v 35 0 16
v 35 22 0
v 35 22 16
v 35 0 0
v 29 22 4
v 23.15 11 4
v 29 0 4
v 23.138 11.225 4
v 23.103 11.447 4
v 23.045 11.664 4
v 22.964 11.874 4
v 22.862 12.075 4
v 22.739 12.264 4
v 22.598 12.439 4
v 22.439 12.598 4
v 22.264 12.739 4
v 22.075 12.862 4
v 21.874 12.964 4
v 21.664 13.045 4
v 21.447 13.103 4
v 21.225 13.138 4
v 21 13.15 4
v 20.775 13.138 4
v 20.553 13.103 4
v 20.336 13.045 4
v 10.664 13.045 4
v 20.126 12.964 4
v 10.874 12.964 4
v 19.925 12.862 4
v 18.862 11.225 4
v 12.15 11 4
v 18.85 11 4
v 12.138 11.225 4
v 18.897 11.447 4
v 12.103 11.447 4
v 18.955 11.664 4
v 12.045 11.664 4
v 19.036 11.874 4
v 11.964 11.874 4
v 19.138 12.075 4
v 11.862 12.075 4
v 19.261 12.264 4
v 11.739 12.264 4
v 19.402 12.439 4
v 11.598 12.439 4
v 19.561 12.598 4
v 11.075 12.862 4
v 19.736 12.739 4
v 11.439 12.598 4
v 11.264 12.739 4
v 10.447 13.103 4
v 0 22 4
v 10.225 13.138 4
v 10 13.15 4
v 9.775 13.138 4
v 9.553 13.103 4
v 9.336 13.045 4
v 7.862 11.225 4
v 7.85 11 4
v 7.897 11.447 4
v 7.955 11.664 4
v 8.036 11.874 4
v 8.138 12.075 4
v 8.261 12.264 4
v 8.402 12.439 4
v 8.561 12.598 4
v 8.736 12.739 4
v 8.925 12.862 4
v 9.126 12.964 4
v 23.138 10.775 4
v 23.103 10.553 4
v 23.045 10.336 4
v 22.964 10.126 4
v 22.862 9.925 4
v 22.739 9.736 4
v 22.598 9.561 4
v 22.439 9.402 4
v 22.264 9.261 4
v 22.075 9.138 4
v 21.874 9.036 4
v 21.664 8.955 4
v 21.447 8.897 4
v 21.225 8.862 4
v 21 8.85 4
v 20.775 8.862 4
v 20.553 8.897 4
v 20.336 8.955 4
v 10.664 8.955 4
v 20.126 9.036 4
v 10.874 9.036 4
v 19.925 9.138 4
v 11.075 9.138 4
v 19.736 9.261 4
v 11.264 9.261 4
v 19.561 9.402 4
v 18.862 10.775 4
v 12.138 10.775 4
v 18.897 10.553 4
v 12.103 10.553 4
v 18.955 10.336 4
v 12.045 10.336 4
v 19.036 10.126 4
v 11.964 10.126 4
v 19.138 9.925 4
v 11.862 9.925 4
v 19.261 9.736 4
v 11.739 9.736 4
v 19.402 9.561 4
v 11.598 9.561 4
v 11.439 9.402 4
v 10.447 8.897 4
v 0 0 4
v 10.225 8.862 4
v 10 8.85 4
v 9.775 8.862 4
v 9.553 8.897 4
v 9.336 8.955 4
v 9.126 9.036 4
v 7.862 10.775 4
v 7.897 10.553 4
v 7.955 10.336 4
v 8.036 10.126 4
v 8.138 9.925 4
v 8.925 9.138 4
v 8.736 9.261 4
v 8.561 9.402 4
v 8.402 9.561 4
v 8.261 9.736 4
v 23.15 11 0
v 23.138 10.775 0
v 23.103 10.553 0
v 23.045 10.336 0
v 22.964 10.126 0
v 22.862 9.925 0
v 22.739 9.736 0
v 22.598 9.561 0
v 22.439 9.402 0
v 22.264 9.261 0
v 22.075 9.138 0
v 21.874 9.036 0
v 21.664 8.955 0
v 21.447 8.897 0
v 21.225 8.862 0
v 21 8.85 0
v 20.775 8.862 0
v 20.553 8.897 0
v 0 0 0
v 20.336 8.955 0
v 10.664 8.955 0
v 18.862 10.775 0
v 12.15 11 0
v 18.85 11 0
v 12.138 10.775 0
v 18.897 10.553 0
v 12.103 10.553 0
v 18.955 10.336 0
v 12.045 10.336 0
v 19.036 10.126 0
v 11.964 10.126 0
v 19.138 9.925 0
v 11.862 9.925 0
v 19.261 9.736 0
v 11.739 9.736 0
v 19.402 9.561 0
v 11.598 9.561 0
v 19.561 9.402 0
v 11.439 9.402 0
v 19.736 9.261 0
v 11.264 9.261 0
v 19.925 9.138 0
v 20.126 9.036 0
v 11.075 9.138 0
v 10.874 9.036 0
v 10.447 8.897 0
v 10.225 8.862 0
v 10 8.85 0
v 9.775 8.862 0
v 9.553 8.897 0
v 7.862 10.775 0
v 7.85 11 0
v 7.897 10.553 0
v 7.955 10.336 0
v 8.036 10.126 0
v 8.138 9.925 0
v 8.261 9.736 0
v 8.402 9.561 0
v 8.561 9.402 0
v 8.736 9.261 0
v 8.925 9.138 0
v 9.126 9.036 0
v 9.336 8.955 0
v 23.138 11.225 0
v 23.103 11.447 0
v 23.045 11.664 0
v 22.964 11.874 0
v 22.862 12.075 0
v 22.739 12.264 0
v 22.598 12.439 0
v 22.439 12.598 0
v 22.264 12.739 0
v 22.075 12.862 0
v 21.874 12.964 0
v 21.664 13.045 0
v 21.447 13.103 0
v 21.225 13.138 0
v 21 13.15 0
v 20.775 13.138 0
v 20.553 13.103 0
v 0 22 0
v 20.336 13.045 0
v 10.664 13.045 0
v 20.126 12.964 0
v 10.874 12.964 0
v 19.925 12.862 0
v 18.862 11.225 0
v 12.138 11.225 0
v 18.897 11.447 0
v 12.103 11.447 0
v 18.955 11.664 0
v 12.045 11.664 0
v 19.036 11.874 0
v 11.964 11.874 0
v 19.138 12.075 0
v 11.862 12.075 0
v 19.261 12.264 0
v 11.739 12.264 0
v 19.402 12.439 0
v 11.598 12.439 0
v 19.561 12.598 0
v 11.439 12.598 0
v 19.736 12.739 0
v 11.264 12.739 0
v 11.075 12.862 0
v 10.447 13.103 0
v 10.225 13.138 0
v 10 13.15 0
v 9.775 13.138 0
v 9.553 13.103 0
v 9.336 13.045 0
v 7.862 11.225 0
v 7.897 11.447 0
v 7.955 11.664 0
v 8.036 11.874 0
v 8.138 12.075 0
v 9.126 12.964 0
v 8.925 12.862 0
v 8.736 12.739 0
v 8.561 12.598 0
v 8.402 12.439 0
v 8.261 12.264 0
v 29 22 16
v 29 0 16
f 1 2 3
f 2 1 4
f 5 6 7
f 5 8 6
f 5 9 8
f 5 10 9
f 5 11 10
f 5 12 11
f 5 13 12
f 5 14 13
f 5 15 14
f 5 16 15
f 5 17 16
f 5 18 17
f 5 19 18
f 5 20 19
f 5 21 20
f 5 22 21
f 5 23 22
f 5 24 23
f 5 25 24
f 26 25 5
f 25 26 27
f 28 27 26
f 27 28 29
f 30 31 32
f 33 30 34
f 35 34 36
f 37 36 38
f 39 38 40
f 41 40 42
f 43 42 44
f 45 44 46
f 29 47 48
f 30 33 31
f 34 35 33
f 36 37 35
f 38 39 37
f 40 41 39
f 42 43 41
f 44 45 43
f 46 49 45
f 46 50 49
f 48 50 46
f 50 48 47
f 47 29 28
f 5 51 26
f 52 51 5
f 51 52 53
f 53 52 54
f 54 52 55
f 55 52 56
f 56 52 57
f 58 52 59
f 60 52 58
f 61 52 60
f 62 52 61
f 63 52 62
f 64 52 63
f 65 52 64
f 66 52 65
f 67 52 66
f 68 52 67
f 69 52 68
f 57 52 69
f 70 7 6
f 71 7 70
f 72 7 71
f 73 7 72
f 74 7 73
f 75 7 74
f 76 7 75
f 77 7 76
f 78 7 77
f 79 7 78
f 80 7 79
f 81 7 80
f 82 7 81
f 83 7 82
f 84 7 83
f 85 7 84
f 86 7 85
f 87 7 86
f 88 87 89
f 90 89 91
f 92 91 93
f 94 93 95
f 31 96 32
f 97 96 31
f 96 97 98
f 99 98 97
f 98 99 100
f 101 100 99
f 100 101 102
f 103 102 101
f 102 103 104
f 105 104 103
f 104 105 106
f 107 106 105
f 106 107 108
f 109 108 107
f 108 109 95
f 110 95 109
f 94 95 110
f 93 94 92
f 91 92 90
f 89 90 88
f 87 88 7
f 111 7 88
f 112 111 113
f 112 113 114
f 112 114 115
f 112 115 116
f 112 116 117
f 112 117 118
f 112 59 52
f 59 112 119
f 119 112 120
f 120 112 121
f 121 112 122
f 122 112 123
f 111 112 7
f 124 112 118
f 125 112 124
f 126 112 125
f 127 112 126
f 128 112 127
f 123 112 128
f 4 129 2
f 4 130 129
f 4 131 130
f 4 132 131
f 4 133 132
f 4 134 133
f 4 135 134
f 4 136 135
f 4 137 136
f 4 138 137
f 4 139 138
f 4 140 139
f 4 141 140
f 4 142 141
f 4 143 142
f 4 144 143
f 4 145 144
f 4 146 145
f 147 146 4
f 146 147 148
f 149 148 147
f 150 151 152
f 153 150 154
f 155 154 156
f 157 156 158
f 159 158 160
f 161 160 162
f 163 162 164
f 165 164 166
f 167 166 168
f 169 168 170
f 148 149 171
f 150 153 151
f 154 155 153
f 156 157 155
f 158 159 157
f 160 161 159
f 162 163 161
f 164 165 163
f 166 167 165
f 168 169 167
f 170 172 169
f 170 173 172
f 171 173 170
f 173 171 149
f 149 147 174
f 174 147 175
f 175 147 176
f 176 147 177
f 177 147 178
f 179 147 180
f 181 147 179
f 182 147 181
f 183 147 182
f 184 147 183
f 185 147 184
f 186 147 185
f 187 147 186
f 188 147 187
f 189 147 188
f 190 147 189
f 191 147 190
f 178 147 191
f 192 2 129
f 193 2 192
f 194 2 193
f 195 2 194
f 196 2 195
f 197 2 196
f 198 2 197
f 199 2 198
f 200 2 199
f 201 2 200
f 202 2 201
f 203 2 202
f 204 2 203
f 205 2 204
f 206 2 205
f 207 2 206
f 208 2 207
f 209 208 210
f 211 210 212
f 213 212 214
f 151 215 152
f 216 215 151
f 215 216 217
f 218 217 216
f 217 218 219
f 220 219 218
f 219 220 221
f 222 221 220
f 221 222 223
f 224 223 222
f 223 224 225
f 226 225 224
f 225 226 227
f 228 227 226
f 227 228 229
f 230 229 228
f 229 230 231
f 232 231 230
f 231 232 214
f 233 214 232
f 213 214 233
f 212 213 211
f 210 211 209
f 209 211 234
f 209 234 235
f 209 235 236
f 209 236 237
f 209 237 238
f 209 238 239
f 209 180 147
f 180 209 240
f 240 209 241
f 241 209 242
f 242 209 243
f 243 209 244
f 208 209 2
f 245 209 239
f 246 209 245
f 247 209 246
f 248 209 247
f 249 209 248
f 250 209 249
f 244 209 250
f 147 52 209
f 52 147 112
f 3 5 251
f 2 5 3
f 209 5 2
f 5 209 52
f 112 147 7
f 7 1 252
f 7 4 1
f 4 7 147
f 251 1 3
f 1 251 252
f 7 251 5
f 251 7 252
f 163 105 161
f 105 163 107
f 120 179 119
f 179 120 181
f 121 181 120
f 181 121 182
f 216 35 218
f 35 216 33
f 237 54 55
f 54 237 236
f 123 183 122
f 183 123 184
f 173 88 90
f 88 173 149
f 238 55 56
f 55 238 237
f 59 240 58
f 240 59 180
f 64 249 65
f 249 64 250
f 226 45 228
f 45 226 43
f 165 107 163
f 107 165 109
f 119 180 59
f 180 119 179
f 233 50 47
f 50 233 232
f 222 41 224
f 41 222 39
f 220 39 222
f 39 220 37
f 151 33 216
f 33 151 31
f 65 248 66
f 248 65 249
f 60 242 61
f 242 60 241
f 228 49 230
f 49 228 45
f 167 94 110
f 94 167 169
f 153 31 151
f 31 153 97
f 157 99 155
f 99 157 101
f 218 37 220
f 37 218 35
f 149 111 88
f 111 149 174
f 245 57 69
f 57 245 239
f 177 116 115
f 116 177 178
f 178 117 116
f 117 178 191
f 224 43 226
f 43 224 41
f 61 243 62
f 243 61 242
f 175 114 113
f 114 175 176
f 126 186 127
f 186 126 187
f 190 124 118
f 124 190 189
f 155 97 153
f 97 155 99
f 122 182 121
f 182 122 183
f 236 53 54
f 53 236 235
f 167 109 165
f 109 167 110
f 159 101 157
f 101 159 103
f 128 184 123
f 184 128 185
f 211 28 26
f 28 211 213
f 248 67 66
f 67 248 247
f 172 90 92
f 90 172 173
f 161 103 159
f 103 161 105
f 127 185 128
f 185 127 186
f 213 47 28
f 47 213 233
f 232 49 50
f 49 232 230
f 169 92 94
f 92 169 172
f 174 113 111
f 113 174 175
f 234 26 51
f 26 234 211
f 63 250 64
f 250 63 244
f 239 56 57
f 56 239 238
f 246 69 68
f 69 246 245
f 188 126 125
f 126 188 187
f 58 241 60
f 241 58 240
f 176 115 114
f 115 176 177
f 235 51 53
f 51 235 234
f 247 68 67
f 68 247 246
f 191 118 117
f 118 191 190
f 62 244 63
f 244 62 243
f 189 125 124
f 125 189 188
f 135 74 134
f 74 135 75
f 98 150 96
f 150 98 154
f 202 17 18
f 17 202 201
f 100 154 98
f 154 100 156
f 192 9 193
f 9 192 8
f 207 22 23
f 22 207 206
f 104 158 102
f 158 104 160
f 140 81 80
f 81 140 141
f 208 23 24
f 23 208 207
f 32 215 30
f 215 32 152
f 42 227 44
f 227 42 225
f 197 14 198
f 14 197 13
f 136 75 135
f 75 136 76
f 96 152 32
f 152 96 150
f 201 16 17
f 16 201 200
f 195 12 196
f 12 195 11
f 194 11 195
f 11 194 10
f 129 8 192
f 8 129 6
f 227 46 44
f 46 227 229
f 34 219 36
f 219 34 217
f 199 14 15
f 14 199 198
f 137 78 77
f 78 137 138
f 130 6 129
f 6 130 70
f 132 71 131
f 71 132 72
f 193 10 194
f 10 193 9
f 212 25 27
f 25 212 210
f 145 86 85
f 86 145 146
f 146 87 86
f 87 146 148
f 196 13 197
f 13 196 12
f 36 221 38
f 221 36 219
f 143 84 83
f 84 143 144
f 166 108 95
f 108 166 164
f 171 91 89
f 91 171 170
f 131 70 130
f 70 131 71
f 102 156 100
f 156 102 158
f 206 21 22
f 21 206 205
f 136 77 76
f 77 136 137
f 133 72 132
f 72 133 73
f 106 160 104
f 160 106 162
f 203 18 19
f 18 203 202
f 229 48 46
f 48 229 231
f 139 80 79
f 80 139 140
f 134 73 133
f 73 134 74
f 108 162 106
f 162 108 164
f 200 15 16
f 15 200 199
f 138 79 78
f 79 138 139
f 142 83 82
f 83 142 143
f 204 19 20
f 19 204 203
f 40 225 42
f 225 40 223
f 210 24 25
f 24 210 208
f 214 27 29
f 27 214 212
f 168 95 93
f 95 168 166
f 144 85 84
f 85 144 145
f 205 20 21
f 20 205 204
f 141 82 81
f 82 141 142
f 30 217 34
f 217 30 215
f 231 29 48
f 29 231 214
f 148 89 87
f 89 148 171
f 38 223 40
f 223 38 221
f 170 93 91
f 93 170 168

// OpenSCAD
// Latch catch plate.
$fn = 60;
eps = 0.02;
length = 35;
height = 12;
width = 22;
thickness = 4;
difference() {
    union() { cube([length,width,thickness]); translate([length-6,0,thickness]) cube([6,width,height]); }
    for(x=[10,length-14]) translate([x,width/2,-eps]) cylinder(d=4.3,h=thickness+2*eps);
}
